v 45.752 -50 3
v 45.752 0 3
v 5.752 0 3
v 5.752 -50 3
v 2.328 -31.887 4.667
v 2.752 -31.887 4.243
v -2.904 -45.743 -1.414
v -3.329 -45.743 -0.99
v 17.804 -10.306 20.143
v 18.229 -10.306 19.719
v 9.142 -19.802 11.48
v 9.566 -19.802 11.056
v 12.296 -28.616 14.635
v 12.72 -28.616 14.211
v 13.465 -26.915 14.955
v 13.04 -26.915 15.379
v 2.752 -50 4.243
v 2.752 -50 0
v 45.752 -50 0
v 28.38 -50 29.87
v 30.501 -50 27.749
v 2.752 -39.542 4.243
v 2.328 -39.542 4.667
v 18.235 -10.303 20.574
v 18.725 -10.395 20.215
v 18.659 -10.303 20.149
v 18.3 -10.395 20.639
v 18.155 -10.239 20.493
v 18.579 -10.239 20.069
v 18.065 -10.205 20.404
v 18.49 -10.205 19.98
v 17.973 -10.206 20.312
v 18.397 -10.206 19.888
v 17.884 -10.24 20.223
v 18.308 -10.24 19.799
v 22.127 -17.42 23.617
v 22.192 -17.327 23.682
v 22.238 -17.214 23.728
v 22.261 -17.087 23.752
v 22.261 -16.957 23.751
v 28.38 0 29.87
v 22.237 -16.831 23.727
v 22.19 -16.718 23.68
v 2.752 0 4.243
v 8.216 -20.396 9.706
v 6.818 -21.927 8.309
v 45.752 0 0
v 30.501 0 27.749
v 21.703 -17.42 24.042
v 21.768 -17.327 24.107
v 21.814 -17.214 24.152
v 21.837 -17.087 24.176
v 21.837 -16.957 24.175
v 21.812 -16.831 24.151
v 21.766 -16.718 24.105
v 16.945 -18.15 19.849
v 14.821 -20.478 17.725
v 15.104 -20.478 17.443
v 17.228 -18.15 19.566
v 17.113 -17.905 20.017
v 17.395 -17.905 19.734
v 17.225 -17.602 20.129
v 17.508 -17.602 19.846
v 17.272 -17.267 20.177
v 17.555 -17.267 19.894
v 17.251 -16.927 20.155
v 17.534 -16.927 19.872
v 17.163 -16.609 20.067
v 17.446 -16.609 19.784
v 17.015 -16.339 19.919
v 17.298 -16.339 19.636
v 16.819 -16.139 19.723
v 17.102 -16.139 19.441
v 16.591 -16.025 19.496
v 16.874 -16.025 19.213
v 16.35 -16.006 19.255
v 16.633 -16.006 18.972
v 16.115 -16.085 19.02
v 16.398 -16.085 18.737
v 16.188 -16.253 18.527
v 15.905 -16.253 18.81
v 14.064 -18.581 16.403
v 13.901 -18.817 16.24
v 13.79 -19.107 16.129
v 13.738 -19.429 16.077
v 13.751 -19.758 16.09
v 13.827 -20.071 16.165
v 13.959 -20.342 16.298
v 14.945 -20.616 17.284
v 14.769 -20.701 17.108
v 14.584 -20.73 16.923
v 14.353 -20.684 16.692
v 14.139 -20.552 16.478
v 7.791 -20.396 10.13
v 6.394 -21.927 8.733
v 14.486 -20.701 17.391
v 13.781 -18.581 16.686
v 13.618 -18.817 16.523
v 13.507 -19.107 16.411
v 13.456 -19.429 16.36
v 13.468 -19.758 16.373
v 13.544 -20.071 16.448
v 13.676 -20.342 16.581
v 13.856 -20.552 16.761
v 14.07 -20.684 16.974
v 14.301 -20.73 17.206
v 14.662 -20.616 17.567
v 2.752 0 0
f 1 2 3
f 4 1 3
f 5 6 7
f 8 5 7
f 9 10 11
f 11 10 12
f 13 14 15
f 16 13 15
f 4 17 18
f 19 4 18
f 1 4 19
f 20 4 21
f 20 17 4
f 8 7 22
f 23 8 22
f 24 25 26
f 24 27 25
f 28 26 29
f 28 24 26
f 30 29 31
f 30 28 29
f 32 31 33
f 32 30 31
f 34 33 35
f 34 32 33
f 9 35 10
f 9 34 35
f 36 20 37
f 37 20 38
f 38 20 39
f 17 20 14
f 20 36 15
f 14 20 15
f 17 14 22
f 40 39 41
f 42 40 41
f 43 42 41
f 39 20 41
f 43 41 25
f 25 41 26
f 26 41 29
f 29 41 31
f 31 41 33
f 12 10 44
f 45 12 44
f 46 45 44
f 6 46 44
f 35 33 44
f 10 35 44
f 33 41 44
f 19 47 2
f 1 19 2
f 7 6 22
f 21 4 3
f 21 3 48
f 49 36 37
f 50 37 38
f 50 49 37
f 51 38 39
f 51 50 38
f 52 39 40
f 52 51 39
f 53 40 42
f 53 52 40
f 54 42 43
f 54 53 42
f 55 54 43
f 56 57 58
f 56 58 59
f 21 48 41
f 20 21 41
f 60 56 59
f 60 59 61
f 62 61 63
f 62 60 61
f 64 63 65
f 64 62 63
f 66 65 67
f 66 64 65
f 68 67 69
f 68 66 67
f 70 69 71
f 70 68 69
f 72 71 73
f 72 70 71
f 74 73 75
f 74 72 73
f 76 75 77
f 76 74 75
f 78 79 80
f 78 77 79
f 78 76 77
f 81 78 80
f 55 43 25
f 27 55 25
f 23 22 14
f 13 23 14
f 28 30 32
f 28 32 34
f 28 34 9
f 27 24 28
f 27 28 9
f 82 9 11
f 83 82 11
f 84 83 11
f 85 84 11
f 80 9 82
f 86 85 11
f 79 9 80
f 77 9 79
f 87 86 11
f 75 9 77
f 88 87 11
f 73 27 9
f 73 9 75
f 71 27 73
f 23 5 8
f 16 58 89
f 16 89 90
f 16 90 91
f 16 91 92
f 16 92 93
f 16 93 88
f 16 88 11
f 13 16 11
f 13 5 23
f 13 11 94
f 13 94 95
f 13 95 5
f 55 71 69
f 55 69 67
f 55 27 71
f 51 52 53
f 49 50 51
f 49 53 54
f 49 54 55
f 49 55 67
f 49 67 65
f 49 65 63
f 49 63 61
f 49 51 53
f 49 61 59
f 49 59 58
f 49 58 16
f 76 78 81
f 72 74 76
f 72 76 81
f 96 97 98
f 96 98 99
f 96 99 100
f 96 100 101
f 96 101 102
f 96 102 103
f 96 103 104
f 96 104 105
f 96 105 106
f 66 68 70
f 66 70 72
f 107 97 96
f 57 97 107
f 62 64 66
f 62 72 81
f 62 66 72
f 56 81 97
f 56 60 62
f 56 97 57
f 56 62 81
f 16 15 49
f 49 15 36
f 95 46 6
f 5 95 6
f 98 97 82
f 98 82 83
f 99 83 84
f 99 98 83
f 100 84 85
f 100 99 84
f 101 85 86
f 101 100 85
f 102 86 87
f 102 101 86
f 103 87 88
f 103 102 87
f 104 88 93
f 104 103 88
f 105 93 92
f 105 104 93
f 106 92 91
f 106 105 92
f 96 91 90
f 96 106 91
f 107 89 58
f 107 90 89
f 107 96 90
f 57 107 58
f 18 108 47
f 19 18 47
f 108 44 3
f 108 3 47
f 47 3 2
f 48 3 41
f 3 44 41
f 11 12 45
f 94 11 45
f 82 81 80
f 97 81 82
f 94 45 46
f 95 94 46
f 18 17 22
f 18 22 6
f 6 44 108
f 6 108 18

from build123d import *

# Parameters (mm, degrees)
F1_DEPTH = 50
F3_DEPTH = 0.6
F4_R     = 0.5
F5_DEPTH = 1


with BuildPart() as f1:
    # F0 (on Front) → F1 (new body)
    with BuildSketch(Plane.XZ):
        Polygon((45.7524405147, 0), (45.7524405147, 3), (5.7524405147, 3), (30.5011778563, 27.7487373415), (28.3798575127, 29.8700576851), (2.7524405147, 4.2426406871), (2.7524405147, 0), align=None)
    extrude(amount=F1_DEPTH)

    # F2 (on face) → F3 (join)
    with BuildSketch(Plane(origin=(-0.7451000862, 0, 0.7451000862), x_dir=(0, -1, 0), z_dir=(-0.7071067812, 0, 0.7071067812))):
        Polygon((28.6160509516, 19.0431820663), (26.9152817478, 20.0955052655), (17.1134265816, 32.7415969661), (10, 27.2280534351), (19.8018551662, 14.5819617345), (20.3959014762, 12.672221181), (21.9274413459, 10.6962693528), (31.8867334894, 4.9462693528), (39.542422512, 4.9462693528), align=None)
        with BuildLine():
            ThreePointArc((16.2533213032, 24.546920712), (16.4666390433, 26.230516727), (18.1502350583, 26.0171989869))
            Line((18.1502350583, 26.0171989869), (20.4781756603, 23.013752208))
            ThreePointArc((20.4781756603, 23.013752208), (20.6650927856, 22.6671048639), (20.7297187827, 22.2786130705))
            ThreePointArc((20.7297187827, 22.2786130705), (19.918210576, 21.1432390676), (18.5812619052, 21.5434739331))
            Line((18.5812619052, 21.5434739331), (16.2533213032, 24.546920712))
        make_face(mode=Mode.SUBTRACT)
        Polygon((45.74313995, -3.0537306472), (39.542422512, 4.9462693528), (31.8867334894, 4.9462693528), align=None)
    extrude(amount=F3_DEPTH)

    # F4
    f4_edges = [f1.edges().sort_by_distance(p)[0] for p in [
        (22.194573, -17.113427, 24.109037),
        (18.295909, -10, 20.210373),
    ]]
    fillet(f4_edges, radius=F4_R)

    # F2 (on face) → F5 (join, symmetric)
    with BuildSketch(Plane(origin=(-0.7451000862, 0, 0.7451000862), x_dir=(0, -1, 0), z_dir=(-0.7071067812, 0, 0.7071067812))):
        with BuildLine():
            ThreePointArc((18.1502350583, 26.0171989869), (18.3371521837, 25.6705516428), (18.4017781807, 25.2820598494))
            ThreePointArc((18.4017781807, 25.2820598494), (17.590269974, 24.1466858465), (16.2533213032, 24.546920712))
            Line((16.2533213032, 24.546920712), (18.5812619052, 21.5434739331))
            ThreePointArc((18.5812619052, 21.5434739331), (18.7945796452, 23.2270699481), (20.4781756603, 23.013752208))
            Line((20.4781756603, 23.013752208), (18.1502350583, 26.0171989869))
        make_face()
        with BuildLine():
            ThreePointArc((16.2533213032, 24.546920712), (17.590269974, 24.1466858465), (18.4017781807, 25.2820598494))
            ThreePointArc((18.4017781807, 25.2820598494), (18.3371521837, 25.6705516428), (18.1502350583, 26.0171989869))
            ThreePointArc((18.1502350583, 26.0171989869), (16.4666390433, 26.230516727), (16.2533213032, 24.546920712))
        make_face()
        with BuildLine():
            ThreePointArc((20.7297187827, 22.2786130705), (20.6650927856, 22.6671048639), (20.4781756603, 23.013752208))
            ThreePointArc((20.4781756603, 23.013752208), (18.7945796452, 23.2270699481), (18.5812619052, 21.5434739331))
            ThreePointArc((18.5812619052, 21.5434739331), (19.918210576, 21.1432390676), (20.7297187827, 22.2786130705))
        make_face()
    extrude(amount=F5_DEPTH, both=True)


solid = f1.part
